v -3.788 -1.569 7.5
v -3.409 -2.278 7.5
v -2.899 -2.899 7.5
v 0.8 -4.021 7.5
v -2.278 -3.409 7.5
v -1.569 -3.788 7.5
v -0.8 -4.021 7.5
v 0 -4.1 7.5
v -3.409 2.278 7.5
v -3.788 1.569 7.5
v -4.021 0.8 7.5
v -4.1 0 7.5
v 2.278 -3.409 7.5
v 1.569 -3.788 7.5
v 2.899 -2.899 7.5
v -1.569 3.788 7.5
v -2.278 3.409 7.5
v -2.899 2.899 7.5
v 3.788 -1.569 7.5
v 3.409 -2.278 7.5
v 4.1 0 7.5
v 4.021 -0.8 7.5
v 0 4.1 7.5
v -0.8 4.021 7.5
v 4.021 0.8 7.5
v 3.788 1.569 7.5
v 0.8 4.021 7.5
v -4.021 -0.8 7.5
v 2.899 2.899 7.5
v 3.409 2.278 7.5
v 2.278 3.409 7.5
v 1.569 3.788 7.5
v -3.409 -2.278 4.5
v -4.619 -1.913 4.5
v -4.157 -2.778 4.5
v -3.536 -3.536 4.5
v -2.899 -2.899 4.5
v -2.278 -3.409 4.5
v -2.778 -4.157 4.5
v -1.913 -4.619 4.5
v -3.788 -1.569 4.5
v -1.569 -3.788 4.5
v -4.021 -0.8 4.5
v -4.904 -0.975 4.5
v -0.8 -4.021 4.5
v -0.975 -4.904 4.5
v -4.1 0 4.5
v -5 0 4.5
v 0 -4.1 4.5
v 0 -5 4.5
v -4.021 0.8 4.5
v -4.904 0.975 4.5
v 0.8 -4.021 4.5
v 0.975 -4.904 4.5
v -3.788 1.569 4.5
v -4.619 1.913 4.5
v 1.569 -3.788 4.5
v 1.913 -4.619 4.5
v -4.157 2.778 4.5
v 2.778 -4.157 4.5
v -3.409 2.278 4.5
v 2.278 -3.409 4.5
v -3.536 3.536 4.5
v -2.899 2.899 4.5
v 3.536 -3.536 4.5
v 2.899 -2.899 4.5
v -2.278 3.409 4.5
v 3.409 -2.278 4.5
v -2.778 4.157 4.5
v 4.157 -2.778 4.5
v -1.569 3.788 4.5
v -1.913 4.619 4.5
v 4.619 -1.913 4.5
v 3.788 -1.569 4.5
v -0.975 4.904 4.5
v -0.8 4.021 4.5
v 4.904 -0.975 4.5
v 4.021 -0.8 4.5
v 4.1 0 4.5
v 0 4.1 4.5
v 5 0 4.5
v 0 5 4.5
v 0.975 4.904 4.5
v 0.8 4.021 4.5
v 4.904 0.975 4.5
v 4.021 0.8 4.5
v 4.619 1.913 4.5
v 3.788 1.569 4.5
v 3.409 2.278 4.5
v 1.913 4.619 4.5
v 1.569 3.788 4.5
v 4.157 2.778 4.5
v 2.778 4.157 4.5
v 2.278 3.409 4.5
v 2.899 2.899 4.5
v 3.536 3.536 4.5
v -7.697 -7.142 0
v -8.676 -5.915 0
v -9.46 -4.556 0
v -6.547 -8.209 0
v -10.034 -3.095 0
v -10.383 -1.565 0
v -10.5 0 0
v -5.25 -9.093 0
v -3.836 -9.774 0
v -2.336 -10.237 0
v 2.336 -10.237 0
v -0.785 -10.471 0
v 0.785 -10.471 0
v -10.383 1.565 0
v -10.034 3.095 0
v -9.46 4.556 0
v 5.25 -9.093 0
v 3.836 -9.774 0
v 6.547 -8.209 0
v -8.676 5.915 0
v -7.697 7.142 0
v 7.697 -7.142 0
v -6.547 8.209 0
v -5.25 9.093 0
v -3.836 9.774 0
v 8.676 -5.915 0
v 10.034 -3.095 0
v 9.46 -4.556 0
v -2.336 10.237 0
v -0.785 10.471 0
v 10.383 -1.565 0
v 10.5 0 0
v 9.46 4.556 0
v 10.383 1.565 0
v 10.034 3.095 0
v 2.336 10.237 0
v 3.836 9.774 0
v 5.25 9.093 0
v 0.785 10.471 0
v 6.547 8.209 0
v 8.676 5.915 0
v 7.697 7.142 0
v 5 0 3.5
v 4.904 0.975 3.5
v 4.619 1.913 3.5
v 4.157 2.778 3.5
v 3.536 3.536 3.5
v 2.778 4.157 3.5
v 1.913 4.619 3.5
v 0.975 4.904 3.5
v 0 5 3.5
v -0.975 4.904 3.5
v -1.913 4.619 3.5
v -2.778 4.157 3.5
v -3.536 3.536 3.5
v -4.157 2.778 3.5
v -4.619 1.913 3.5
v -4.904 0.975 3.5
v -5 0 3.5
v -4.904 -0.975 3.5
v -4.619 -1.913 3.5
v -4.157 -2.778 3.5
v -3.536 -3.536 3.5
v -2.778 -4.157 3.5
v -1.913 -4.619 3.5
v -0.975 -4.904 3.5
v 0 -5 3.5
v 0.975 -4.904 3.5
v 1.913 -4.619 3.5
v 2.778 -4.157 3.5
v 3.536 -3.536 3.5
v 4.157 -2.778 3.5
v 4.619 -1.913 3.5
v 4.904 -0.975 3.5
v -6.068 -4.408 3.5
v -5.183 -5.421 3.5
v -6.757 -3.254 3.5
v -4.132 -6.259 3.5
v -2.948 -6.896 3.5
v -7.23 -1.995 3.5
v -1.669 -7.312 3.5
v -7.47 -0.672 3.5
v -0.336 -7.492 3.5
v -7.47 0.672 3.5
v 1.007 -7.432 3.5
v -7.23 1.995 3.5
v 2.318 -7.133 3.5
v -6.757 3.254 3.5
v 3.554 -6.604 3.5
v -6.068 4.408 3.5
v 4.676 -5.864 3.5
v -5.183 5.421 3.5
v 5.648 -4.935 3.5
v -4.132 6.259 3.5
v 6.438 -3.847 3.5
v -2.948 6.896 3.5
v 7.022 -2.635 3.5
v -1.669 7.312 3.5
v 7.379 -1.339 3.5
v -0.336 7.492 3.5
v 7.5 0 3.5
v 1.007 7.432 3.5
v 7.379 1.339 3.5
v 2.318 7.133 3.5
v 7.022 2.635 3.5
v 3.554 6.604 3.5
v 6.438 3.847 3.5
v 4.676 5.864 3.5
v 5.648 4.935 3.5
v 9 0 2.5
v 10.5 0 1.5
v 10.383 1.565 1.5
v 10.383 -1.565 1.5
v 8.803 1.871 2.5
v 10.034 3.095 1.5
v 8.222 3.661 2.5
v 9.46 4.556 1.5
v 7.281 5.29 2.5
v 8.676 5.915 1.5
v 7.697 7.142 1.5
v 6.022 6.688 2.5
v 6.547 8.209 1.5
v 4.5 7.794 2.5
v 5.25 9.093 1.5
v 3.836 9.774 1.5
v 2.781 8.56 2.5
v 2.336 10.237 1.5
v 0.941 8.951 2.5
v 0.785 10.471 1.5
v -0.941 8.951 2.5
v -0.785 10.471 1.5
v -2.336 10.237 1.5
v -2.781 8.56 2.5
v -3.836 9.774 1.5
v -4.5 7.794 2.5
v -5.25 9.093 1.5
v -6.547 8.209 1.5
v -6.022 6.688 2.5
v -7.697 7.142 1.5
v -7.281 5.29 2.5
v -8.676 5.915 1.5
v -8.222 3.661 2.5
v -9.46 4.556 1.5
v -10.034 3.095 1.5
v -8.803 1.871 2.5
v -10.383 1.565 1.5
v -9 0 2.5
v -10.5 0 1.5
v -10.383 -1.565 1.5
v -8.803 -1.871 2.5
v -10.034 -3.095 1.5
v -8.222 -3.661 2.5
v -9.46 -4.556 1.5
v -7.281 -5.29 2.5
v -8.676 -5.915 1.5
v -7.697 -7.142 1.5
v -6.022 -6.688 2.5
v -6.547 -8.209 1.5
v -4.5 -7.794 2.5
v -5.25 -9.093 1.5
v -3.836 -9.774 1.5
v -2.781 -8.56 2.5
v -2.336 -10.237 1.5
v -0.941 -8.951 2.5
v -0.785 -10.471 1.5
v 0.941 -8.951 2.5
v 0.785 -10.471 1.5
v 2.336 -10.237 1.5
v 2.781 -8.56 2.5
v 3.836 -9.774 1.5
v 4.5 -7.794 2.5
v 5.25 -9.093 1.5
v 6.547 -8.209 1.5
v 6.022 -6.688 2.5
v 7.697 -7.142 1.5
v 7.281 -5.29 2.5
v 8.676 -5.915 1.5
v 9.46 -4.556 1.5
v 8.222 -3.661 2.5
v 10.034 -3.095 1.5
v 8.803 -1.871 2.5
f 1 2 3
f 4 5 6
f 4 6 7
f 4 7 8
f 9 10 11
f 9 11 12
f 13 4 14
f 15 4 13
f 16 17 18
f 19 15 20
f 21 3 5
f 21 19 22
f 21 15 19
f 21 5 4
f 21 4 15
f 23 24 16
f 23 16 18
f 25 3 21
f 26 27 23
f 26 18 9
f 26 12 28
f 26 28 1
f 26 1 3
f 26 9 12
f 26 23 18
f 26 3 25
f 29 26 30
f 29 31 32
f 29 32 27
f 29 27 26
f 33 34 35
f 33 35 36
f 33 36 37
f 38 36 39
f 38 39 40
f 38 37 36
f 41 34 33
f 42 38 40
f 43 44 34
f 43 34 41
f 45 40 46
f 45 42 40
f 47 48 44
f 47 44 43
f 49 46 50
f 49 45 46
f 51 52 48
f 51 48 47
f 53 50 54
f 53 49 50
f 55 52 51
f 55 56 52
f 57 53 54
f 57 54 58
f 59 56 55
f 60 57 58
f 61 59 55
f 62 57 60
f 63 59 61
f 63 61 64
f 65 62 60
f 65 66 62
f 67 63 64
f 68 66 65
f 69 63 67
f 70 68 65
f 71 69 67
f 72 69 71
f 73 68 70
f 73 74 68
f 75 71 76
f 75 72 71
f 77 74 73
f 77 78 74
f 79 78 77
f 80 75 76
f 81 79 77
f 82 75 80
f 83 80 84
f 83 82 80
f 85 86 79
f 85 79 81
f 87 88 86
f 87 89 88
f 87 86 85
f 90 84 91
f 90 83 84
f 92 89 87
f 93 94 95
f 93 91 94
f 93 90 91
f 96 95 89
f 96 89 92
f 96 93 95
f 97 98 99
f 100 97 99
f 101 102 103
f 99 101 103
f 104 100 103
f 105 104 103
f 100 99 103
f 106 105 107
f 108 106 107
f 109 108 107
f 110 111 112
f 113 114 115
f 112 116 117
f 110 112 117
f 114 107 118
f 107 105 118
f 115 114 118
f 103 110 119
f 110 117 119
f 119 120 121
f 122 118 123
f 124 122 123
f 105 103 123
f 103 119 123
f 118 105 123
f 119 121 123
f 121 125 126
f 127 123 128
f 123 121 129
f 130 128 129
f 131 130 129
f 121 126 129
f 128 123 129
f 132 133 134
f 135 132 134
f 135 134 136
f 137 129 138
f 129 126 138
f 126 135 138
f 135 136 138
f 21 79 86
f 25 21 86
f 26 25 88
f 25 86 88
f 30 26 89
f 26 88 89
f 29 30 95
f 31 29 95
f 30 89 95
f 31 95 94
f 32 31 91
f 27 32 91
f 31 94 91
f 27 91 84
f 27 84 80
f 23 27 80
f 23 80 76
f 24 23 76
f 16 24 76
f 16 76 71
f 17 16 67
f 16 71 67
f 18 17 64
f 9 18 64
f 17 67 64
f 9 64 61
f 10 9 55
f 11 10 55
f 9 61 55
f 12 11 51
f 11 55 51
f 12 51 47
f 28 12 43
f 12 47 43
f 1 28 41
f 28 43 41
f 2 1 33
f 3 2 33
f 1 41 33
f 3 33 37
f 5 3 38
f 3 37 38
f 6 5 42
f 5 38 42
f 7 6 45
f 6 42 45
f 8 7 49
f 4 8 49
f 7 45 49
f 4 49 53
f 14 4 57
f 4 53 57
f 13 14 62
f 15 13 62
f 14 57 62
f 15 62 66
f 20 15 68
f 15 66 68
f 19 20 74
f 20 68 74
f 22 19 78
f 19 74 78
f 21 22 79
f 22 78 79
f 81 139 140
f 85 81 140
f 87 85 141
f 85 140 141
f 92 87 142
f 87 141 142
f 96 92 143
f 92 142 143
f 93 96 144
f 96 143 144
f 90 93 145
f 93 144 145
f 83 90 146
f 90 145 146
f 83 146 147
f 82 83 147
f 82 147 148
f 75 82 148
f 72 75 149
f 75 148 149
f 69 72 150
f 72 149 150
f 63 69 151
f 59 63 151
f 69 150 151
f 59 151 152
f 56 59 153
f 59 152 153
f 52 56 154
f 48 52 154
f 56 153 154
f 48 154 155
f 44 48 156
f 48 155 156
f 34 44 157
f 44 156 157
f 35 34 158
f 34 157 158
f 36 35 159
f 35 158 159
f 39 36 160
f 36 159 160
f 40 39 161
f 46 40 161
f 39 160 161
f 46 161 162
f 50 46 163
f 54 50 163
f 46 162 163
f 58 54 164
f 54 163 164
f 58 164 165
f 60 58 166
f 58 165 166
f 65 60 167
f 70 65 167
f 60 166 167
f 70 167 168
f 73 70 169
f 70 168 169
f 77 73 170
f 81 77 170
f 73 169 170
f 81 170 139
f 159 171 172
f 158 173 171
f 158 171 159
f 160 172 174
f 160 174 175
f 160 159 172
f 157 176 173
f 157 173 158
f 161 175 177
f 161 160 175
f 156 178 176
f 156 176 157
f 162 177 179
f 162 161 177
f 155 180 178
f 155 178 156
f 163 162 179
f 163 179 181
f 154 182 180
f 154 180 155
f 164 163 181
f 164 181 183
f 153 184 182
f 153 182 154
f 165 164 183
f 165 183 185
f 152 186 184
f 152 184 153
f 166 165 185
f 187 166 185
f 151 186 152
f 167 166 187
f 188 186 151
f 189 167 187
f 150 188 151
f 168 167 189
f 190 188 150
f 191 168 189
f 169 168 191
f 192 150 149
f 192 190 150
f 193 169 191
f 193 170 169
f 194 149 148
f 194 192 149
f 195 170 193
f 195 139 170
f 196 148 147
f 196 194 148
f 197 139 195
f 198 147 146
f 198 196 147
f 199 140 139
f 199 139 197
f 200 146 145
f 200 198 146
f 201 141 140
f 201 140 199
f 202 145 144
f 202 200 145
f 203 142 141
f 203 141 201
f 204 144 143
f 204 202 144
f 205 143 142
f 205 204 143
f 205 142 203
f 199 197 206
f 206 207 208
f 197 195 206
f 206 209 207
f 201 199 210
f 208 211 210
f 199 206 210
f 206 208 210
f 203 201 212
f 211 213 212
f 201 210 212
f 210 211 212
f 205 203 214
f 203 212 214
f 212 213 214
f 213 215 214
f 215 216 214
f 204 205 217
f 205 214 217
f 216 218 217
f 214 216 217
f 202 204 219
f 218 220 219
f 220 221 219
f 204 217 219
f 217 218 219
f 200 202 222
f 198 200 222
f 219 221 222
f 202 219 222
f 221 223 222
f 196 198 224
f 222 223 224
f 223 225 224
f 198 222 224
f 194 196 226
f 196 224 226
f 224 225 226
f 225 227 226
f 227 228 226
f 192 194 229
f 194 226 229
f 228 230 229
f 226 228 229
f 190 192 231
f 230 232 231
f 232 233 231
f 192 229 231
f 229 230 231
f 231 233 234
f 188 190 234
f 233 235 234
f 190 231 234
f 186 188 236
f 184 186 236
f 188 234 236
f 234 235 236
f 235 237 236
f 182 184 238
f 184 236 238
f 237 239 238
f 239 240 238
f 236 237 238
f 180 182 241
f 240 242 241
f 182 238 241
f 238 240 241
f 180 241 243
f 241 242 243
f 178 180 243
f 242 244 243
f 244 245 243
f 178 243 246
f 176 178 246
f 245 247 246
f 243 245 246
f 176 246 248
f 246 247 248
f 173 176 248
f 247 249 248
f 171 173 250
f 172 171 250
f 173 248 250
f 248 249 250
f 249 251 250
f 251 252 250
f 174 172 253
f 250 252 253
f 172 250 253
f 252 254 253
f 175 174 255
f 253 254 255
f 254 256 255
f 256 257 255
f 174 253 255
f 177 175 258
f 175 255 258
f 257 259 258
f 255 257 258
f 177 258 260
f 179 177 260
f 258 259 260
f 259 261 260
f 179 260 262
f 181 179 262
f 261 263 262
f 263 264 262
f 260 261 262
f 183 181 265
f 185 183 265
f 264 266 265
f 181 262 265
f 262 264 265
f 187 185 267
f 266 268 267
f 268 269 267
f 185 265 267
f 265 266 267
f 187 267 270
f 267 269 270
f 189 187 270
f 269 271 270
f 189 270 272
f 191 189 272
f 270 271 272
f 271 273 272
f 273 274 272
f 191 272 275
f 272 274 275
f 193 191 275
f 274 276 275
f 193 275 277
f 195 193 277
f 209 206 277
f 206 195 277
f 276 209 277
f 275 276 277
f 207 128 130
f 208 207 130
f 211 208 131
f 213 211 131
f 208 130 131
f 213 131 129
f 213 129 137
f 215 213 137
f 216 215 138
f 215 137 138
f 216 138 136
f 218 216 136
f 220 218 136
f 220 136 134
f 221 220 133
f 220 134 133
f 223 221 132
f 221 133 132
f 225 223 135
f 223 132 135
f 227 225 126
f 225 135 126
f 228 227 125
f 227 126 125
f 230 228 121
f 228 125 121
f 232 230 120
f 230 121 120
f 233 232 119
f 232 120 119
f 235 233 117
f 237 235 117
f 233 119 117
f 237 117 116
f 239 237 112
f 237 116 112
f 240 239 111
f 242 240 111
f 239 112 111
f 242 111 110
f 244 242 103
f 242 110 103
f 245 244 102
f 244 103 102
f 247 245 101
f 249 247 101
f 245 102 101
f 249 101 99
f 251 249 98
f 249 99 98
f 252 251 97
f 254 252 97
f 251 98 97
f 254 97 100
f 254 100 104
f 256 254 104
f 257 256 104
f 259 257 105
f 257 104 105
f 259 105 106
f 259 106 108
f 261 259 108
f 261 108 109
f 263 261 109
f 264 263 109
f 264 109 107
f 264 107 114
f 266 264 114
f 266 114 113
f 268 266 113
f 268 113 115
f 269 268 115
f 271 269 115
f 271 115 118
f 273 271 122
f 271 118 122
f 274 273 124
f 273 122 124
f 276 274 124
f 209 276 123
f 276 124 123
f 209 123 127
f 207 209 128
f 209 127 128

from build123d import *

# Parameters (mm, degrees)
F0_R     = 10.5
F1_DEPTH = 3.5
F2_R     = 5
F3_DEPTH = 1
F4_R     = 4.1
F5_DEPTH = 3
F6_SIZE2 = 2
F6_SIZE  = 3


with BuildPart() as f1:
    # F0 (on Top) → F1 (new body)
    with BuildSketch(Plane.XY):
        Circle(F0_R)
    extrude(amount=F1_DEPTH)

    # F2 (on face) → F3 (join)
    with BuildSketch(Plane.XY.offset(3.5)):
        Circle(F2_R)
    extrude(amount=F3_DEPTH)

    # F4 (on face) → F5 (join)
    with BuildSketch(Plane.XY.offset(4.5)):
        Circle(F4_R)
    extrude(amount=F5_DEPTH)

    # F6
    f6_edges = [f1.edges().sort_by_distance(p)[0] for p in [
        (-10.5, 0, 3.5),
    ]]
    f6_side = f1.faces().sort_by_distance((-10.203015, 0, 3.5))[0]
    chamfer(f6_edges, length=F6_SIZE, length2=F6_SIZE2, reference=f6_side)


solid = f1.part
